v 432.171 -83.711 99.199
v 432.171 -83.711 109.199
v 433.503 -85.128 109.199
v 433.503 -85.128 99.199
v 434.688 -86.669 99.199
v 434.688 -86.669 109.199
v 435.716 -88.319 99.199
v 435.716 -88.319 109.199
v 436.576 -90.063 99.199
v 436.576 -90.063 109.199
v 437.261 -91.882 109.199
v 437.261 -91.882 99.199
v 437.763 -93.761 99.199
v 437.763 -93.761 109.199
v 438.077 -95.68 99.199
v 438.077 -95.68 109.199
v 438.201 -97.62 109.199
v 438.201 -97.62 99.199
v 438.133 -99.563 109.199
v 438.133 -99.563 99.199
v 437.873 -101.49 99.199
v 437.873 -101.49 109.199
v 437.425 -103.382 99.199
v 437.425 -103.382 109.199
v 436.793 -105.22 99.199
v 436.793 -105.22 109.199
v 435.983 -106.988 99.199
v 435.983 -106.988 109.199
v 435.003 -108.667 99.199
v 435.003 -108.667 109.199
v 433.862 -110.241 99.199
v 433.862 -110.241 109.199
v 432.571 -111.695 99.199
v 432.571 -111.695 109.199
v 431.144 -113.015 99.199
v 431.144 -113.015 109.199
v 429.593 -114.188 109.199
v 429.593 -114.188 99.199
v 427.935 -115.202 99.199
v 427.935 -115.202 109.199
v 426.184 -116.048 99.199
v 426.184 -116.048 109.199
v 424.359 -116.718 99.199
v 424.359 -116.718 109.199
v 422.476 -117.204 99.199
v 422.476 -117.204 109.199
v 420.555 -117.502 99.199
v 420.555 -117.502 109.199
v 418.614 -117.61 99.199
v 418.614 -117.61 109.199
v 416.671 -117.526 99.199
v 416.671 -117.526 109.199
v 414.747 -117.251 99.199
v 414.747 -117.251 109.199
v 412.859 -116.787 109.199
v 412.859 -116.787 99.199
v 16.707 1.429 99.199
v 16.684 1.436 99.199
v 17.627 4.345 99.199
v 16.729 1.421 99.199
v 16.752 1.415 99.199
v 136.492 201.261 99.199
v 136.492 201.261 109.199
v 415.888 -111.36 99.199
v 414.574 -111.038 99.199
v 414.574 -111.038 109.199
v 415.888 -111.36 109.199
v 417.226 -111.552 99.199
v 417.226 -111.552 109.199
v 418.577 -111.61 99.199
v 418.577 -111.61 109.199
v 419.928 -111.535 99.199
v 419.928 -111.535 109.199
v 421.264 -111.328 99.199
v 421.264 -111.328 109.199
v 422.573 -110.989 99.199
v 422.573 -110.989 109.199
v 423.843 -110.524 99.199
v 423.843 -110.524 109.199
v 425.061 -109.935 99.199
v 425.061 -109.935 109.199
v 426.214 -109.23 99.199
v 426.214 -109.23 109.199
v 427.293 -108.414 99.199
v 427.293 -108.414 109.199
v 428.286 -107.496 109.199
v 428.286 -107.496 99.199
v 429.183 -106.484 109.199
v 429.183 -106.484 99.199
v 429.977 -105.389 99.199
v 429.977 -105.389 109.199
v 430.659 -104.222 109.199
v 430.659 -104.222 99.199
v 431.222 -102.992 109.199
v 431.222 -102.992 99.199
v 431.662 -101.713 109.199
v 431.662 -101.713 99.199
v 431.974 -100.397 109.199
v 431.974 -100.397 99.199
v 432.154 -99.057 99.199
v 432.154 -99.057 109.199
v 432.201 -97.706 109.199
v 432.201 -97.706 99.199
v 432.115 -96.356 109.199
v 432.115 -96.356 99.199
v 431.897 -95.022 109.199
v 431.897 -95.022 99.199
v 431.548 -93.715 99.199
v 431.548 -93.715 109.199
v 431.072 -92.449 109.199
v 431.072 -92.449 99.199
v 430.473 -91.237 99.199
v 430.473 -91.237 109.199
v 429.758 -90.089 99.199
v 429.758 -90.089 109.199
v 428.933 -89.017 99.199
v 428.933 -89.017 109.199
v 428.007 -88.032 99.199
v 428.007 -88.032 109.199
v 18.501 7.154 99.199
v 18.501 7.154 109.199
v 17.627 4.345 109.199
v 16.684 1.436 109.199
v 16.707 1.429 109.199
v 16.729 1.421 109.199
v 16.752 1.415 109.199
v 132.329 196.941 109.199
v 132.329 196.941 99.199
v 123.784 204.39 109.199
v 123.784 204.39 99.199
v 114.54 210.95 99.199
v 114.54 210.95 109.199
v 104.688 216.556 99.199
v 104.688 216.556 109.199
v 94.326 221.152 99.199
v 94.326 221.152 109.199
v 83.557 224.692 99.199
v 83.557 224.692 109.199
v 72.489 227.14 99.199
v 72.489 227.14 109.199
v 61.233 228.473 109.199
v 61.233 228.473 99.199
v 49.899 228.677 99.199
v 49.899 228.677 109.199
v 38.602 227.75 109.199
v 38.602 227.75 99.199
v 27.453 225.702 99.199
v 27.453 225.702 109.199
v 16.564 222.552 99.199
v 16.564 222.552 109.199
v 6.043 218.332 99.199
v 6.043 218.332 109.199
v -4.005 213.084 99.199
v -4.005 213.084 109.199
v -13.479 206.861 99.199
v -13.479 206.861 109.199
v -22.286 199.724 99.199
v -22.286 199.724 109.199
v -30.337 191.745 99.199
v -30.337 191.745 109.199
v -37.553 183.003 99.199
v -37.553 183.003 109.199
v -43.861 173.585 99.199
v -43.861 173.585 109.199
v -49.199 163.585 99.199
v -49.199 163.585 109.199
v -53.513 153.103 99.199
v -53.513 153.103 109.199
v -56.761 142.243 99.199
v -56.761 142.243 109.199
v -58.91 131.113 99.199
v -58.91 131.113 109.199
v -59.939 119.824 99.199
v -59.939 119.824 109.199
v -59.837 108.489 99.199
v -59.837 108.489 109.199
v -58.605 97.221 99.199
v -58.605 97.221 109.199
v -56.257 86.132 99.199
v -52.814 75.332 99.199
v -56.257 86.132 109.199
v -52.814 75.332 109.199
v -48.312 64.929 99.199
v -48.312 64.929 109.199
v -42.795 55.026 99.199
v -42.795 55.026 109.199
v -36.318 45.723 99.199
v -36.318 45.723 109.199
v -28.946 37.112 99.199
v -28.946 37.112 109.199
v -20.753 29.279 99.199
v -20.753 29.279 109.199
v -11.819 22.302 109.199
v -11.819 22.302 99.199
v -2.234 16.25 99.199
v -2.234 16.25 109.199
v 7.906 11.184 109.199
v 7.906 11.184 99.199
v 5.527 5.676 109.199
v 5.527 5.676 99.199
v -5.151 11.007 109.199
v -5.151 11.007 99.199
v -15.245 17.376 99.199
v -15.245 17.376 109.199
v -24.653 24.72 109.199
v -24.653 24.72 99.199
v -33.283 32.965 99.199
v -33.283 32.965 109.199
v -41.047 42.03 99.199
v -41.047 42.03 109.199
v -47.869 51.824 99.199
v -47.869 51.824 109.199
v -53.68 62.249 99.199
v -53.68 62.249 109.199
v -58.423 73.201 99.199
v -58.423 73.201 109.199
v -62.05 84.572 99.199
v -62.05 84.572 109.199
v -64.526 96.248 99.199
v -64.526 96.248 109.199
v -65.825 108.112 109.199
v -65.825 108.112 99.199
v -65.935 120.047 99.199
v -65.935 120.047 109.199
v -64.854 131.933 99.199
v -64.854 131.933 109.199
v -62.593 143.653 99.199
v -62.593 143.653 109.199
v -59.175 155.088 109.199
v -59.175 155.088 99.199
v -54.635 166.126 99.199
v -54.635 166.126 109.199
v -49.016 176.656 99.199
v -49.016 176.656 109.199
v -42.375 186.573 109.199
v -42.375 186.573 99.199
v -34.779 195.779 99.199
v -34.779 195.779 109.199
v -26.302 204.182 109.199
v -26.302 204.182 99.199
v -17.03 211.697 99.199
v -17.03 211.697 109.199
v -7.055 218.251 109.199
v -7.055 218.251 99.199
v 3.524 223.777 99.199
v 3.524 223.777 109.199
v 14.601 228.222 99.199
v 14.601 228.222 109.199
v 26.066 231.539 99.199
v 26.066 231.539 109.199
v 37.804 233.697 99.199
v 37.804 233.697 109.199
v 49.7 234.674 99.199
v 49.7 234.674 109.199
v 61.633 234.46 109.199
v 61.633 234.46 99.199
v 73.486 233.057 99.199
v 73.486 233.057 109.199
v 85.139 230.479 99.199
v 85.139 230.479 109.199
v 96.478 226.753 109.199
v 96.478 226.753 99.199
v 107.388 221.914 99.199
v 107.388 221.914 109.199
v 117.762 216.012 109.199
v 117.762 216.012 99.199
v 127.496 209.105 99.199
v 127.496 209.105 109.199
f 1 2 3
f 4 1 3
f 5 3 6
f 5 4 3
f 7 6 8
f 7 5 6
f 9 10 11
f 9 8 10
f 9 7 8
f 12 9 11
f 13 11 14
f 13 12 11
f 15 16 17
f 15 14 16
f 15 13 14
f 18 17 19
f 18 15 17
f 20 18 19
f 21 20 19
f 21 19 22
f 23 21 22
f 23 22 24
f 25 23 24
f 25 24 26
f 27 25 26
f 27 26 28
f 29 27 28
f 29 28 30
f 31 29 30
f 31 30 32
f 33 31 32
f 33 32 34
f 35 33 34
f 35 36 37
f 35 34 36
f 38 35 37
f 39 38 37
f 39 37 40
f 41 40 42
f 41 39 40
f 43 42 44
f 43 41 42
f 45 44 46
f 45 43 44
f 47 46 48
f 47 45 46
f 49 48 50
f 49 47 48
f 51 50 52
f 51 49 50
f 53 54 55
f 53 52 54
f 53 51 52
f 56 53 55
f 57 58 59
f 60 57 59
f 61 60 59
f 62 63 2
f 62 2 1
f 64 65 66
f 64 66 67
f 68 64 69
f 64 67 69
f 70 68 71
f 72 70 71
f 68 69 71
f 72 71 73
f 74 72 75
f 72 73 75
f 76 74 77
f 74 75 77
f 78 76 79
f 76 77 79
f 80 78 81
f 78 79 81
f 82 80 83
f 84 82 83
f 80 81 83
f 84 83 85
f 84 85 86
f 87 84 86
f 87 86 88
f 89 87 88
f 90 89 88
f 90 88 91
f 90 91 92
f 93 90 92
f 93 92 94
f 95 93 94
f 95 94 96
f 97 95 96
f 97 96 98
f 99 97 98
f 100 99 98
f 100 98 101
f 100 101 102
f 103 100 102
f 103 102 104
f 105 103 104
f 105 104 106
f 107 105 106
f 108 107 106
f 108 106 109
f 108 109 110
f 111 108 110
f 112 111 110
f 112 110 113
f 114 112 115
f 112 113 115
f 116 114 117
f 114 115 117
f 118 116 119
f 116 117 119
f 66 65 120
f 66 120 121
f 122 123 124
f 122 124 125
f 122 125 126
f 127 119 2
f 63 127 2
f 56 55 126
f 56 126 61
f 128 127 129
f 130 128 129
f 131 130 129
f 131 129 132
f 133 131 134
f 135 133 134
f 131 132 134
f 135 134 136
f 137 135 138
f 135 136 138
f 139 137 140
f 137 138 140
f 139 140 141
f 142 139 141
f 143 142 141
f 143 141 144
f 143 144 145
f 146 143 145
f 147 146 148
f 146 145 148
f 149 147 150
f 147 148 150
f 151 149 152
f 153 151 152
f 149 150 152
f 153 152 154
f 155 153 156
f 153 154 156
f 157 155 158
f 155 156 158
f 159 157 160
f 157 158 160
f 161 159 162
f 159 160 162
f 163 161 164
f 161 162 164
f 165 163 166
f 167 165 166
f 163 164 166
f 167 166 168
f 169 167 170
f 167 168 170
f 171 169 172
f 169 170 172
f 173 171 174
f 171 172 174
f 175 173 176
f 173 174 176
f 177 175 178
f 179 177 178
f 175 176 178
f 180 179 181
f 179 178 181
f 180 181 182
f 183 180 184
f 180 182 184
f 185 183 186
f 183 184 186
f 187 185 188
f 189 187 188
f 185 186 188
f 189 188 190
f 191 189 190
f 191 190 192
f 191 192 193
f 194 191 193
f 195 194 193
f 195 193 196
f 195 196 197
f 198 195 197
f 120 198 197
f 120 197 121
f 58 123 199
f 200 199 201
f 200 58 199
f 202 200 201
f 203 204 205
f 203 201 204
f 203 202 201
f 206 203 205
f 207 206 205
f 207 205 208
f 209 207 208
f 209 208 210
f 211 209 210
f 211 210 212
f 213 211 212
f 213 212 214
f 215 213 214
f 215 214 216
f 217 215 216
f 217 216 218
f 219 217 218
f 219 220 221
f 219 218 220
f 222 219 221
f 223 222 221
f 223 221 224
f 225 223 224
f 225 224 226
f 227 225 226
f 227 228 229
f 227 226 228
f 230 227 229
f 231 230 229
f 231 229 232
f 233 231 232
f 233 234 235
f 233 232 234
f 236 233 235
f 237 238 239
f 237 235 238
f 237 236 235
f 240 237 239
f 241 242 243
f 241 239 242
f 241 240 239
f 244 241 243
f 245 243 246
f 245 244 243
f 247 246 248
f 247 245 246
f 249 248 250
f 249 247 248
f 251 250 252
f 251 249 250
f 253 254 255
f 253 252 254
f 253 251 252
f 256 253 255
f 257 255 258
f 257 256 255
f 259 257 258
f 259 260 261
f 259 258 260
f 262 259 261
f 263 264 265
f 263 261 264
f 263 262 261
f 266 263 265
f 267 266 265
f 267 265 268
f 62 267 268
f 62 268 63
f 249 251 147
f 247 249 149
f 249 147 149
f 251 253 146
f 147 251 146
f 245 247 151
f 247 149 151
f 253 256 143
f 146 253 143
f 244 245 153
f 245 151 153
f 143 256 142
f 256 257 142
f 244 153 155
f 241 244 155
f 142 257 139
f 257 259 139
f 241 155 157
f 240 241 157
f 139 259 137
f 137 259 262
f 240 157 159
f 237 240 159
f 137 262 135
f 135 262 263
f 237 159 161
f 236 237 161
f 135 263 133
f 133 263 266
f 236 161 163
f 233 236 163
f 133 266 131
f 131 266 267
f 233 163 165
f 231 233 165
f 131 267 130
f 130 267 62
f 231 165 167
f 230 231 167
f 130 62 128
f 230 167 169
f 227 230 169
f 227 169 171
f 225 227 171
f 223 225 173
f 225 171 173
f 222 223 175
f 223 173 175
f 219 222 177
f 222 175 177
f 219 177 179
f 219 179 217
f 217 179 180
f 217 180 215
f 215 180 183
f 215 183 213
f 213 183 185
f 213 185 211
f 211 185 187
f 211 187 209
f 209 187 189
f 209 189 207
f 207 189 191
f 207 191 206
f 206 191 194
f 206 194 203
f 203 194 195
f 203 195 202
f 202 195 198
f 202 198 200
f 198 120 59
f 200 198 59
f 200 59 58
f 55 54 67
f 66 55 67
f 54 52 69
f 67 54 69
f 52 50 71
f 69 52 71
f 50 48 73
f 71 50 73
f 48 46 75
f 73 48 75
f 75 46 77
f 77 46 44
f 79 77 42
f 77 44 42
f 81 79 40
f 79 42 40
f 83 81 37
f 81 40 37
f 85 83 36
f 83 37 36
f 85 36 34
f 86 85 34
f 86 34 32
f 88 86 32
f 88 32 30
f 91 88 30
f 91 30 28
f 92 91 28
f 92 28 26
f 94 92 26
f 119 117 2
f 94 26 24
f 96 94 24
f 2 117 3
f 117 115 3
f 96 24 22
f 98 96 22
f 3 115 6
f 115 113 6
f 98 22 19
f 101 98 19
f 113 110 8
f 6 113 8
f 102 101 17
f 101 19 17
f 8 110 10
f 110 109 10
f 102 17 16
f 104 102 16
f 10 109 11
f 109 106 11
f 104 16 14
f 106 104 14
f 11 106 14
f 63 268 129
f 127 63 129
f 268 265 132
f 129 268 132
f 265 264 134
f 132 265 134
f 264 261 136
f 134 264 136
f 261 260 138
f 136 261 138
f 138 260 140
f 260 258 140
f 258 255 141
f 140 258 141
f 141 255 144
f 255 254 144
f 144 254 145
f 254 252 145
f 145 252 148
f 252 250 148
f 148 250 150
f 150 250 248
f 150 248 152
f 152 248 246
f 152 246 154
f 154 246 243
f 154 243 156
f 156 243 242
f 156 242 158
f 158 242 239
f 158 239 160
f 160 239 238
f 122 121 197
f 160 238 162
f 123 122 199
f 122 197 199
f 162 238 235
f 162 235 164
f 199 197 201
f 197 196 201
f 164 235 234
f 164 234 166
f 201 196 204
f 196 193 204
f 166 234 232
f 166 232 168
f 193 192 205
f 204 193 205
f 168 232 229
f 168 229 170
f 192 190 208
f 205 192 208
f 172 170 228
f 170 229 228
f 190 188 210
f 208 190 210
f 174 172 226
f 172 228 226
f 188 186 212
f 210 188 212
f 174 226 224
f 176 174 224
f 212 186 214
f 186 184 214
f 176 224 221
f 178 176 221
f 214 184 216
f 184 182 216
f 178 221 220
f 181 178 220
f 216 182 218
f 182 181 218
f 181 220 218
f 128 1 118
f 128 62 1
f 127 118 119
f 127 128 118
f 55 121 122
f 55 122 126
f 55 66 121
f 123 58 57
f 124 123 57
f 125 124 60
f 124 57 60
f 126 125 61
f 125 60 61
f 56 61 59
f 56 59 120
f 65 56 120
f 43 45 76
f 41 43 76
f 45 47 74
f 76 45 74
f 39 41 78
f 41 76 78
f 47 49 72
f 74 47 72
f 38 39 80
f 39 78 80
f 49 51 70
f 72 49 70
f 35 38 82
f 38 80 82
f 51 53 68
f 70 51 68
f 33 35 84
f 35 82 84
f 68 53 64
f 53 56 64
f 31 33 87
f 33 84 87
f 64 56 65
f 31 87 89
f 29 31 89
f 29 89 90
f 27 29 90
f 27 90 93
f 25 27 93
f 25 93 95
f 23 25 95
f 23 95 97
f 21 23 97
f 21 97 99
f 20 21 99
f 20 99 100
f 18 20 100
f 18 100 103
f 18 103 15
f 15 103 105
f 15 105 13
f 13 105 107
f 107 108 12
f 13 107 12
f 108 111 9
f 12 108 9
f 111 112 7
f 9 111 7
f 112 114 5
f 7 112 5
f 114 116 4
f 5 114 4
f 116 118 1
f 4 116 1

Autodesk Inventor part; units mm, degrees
ref_plane "YZ Plane" through (0, 0, 0) normal (1, 0, 0) x (0, 1, 0)
ref_plane "XZ Plane" through (0, 0, 0) normal (0, 1, 0) x (-1, 0, 0)
ref_plane "Work Plane6" through (-3.713488, 14.864291, 104.198762) normal (0, 0, 1) x (0.9994468, -0.0332592, 0)
sketch "Sketch1" plane through (-3.713488, 14.864291, 104.198762) normal (0, 0, 1) x (0.9994468, -0.0332592, 0)
  arc A0 (131.880776, 188.685572) -> (21.678185, -9.803405) centre (53.87003, 102.160585) ccw
  line L0 (131.880776, 188.685572) -> (436.873817, -86.295513)
  circle A1 centre (53.87003, 102.160585) radius 17.5
  arc A2 (21.678185, -9.803405) -> (24.529382, -10.584155) centre (53.87003, 102.160585) ccw
  arc A3 (421.49686, -114.765827) -> (436.873817, -86.295513) centre (425.724642, -98.66153) ccw
  line L1 (21.678185, -9.803405) -> (421.49686, -114.765827)
ref_plane "Work Plane13" through (20.450302, 3.470164, 104.198762) normal (0.9582447, -0.2859495, 0) x (0.2859495, 0.9582447, 0)
sketch "Sketch2" plane through (82.301795, 210.740594, 104.198762) normal (0.9582447, -0.2859495, 0) x (0.2859495, 0.9582447, 0)
  line L0 (-213.329407, -5) -> (-219.329407, -5)
  line L1 (-219.329407, -5) -> (-219.329407, 5)
  line L2 (-219.329407, 5) -> (-213.329407, 5)
  line L3 (-213.329407, 5) -> (-213.329407, -5)
  line L4 (-219.329407, -5) -> (-213.329407, 5) construction
  line L5 (-219.329407, 5) -> (-213.329407, -5) construction
  point P0 (-216.329407, 0)
  point P1 (-216.329407, 0)
  point P2 (-216.329407, 0)
  point P3 (-216.329407, 0)
  dimension "d0" = 6
  dimension "d1" = 10
sweep "Sweep1" add profiles "Sketch2" path "Sketch1" path curves L1 A3 L0 A0
properties part number "Cadena2"
